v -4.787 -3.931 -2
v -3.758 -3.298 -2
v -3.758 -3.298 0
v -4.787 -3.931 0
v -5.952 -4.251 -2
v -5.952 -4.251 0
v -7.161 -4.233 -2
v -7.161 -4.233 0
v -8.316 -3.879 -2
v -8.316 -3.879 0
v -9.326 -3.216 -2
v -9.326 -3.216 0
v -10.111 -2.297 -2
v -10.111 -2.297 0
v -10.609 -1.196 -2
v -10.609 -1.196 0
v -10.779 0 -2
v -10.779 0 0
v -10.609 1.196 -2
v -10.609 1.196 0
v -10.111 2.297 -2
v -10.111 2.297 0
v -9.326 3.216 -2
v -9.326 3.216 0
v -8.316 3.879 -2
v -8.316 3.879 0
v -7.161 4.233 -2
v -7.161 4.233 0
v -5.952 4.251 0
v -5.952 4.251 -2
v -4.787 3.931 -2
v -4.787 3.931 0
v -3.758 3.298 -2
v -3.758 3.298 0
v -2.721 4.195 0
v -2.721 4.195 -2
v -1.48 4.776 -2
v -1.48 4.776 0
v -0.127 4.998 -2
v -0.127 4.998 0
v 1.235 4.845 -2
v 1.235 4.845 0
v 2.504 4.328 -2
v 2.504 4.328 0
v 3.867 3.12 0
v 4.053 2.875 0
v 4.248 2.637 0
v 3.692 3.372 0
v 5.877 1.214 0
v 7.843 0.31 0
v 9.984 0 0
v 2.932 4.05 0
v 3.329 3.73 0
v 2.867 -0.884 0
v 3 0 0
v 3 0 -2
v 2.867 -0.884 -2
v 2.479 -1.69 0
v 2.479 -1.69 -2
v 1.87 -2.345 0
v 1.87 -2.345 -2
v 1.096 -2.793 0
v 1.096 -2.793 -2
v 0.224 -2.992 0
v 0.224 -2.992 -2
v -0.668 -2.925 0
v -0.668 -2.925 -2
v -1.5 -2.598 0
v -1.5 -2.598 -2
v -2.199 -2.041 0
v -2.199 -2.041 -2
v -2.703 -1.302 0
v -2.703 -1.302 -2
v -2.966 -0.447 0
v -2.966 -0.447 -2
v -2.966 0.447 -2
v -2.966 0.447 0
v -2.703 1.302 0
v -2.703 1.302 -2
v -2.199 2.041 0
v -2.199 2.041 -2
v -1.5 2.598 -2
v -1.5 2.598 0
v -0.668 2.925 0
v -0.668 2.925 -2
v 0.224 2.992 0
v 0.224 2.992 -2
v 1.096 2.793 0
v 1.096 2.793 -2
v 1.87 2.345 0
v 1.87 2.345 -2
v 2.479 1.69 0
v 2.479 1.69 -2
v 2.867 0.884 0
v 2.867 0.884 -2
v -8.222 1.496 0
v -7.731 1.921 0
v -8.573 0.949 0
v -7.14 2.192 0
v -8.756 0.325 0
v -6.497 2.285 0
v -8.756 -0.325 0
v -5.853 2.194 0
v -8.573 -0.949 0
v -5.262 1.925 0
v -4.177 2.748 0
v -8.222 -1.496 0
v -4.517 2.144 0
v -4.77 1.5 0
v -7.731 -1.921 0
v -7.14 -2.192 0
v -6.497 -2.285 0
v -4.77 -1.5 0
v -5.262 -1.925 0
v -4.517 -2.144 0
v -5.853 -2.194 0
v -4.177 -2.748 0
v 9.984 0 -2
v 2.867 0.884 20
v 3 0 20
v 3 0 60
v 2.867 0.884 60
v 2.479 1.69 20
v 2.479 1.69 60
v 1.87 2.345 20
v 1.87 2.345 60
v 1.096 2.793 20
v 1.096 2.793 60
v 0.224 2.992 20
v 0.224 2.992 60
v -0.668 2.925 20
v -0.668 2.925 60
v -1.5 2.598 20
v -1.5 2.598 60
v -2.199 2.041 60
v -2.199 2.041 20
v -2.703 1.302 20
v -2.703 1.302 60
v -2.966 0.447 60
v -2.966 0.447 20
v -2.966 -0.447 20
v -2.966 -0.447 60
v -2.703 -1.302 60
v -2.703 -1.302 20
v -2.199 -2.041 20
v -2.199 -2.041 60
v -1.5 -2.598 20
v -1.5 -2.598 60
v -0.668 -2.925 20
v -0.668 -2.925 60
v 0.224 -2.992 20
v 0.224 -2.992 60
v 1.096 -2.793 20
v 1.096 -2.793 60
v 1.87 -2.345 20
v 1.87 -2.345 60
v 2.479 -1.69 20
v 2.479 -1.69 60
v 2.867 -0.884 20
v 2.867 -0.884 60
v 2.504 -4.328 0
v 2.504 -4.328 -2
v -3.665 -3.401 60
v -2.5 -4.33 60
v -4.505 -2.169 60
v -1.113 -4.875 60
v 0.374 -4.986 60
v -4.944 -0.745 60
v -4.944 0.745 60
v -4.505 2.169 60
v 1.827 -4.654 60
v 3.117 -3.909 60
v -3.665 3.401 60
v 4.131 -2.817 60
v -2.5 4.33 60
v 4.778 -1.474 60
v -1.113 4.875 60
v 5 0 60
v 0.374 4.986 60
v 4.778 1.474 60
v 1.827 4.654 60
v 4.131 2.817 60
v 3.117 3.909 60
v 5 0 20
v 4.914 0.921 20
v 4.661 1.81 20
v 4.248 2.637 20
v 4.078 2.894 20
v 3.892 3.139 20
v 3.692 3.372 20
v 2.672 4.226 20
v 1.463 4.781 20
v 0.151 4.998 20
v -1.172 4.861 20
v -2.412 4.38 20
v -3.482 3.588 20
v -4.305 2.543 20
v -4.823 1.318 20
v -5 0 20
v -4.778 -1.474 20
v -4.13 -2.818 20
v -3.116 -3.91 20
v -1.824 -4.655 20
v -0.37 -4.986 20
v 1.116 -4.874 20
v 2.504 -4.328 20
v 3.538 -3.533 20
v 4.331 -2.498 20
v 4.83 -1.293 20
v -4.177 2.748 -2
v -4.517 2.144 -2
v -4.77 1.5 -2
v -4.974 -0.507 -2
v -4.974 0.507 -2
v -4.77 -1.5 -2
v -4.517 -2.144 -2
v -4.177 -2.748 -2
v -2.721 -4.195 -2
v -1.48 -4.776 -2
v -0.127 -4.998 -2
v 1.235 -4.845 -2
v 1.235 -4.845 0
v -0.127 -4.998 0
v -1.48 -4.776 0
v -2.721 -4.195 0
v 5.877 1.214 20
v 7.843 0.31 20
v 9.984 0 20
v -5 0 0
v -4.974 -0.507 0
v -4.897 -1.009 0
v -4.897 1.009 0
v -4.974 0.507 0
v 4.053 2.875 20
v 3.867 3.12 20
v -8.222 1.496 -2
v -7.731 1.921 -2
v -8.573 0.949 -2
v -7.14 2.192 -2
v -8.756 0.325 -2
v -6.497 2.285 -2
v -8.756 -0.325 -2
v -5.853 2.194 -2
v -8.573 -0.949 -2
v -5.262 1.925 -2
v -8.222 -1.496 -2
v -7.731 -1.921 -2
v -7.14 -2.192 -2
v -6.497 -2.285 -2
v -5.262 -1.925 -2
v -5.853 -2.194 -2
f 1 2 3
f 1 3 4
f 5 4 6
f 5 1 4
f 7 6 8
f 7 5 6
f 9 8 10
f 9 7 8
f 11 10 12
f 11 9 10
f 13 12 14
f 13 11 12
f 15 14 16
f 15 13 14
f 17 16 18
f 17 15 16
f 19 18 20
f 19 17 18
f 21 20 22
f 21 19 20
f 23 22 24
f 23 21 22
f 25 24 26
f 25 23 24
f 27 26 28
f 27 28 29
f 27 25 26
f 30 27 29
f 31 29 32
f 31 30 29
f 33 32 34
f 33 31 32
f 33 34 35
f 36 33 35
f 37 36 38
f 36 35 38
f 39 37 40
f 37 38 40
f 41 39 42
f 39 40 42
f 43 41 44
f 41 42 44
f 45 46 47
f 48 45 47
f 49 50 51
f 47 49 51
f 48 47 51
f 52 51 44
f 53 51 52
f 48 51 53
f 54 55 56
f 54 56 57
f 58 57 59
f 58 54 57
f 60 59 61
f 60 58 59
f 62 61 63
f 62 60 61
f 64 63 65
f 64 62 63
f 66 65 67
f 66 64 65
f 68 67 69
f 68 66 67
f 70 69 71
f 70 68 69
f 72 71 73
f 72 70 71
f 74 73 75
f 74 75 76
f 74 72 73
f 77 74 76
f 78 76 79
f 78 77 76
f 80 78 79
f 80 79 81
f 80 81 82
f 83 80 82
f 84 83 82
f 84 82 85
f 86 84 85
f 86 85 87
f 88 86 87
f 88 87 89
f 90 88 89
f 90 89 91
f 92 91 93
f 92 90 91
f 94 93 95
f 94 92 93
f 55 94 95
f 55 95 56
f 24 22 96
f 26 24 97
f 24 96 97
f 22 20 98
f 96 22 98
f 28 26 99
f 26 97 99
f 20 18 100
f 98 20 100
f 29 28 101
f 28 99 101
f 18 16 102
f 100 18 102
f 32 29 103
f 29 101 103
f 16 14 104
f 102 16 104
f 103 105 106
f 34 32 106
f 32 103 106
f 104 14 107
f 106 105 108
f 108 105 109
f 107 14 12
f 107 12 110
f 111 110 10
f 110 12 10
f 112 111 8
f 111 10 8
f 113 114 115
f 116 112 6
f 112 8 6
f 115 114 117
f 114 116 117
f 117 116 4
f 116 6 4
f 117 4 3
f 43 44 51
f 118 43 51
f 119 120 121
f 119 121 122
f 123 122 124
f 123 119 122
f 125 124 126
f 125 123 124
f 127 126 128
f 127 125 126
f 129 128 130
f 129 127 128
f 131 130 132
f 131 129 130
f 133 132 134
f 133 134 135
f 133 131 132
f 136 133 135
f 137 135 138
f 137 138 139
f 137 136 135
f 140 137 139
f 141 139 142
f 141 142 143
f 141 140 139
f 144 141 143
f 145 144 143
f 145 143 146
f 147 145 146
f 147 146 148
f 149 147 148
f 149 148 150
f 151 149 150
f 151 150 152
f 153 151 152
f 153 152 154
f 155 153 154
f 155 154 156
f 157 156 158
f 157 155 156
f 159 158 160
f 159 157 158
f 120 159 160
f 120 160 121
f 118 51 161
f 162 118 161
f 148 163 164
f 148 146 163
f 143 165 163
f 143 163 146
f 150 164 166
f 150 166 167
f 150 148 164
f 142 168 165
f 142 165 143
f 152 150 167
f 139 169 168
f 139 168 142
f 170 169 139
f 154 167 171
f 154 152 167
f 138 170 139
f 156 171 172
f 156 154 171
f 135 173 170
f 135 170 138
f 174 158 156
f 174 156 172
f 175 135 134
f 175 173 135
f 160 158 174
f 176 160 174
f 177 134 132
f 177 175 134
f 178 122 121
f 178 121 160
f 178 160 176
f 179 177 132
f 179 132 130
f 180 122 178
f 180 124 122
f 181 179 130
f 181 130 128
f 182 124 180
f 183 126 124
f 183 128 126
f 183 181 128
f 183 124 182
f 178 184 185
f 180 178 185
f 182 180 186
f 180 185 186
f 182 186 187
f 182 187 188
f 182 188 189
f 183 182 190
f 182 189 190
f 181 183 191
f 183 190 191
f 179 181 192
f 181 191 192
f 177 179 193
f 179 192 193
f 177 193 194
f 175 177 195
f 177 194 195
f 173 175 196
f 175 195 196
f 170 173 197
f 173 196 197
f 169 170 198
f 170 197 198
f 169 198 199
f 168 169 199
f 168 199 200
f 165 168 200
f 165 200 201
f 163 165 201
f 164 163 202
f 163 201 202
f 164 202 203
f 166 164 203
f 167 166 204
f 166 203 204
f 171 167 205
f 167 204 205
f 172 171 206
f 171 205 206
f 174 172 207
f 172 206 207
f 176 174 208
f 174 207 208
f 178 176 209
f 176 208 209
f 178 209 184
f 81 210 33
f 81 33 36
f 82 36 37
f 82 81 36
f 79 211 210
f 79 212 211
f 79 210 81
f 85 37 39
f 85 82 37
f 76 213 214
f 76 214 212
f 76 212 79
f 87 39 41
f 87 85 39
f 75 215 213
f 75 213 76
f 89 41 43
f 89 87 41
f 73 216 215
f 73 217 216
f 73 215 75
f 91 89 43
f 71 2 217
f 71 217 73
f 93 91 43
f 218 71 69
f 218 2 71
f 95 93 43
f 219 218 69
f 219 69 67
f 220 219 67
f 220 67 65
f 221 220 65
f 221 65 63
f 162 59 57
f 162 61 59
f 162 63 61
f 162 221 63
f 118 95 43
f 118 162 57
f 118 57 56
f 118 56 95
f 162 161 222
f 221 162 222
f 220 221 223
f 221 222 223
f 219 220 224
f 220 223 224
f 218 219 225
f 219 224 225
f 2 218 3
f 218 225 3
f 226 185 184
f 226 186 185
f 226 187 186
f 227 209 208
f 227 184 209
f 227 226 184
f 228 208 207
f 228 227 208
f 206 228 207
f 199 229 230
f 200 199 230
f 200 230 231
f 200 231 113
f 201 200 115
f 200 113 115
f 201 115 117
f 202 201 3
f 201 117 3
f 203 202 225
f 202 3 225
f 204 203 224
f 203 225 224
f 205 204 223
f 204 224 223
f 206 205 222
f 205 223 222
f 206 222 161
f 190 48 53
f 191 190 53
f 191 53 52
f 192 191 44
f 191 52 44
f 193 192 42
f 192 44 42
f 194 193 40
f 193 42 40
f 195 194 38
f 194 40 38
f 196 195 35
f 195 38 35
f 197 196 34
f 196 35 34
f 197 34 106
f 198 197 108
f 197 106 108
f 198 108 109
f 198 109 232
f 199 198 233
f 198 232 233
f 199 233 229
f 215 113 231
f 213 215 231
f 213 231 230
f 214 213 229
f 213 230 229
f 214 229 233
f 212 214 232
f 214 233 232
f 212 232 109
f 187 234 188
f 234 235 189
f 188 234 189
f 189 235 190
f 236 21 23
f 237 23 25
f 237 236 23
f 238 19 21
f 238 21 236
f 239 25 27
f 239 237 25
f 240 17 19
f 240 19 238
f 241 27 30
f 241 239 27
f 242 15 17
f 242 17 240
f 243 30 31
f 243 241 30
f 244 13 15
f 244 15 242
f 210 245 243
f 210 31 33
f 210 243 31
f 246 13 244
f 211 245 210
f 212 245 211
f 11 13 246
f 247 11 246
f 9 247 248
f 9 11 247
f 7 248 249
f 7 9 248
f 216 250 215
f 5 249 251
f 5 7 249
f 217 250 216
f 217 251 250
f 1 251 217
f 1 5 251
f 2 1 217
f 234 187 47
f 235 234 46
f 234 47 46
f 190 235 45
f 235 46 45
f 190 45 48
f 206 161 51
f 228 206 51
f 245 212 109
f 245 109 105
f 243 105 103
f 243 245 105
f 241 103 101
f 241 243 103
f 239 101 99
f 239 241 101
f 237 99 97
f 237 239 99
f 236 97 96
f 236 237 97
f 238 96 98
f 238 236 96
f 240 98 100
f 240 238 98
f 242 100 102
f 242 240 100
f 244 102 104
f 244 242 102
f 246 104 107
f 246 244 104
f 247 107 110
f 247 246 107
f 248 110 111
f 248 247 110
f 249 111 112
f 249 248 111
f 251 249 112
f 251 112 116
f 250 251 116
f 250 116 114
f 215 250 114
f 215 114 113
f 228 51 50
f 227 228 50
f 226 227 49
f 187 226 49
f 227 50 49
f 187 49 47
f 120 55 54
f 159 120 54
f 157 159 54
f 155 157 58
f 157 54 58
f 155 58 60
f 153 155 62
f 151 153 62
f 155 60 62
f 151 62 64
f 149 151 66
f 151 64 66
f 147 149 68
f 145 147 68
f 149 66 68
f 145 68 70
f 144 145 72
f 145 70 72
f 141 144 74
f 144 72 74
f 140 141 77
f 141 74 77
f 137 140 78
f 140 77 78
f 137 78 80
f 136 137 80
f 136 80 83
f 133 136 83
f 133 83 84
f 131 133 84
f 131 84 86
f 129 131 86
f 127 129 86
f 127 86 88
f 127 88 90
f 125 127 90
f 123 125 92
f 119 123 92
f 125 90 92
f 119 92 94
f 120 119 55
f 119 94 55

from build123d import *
from build123d import SkipClean  # not in build123d's __all__

# Parameters (mm, degrees)
F1_DEPTH = 20
F2_R     = 5
F2_R_2   = 3
F3_DEPTH = 40
F4_R     = 3
F5_DEPTH = 2
F7_DEPTH = 2


with BuildPart() as f1:
    # F0 (on Top) → F1 (new body)
    with BuildSketch(Plane.XY):
        with BuildLine():
            ThreePointArc((3.6918747639, 3.3719520649), (-1.8084006996, 4.661511226), (-5, 0))
            ThreePointArc((-5, 0), (-2.4980082156, -4.3312763656), (2.503981982, -4.327825578))
            Line((2.503981982, -4.327825578), (9.9840974016, 0))
            ThreePointArc((9.9840974016, 0), (6.8273158844, 0.6909487043), (4.2478112604, 2.637441847))
            ThreePointArc((4.2478112604, 2.637441847), (3.9586403918, 2.9962179106), (3.6918747639, 3.3719520649))
        make_face()
        with BuildLine():
            ThreePointArc((-3, 0), (0, 3), (3, 0))
            ThreePointArc((3, 0), (0, -3), (-3, 0))
        make_face(mode=Mode.SUBTRACT)
    extrude(amount=F1_DEPTH)

    # F2 (on face) → F3 (join)
    with BuildSketch(Plane.XY.offset(20)):
        Circle(F2_R)
        Circle(F2_R_2, mode=Mode.SUBTRACT)
    extrude(amount=F3_DEPTH)

    # F4 (on face) → F5 (join)
    with BuildSketch(Plane(origin=(0, 0, 0), x_dir=(1, 0, 0), z_dir=(0, 0, -1))):
        with BuildLine():
            ThreePointArc((3.6918747639, -3.3719520649), (6.414709273, -0.8961214102), (9.9840974016, 0))
            Line((9.9840974016, 0), (2.503981982, 4.327825578))
            ThreePointArc((2.503981982, 4.327825578), (-5, 0), (2.503981982, -4.327825578))
            ThreePointArc((2.503981982, -4.327825578), (3.1345787192, -3.8954353098), (3.6918747639, -3.3719520649))
        make_face()
        Circle(F4_R, mode=Mode.SUBTRACT)
        with BuildLine():
            Line((2.503981982, -4.327825578), (9.9840974016, 0))
            ThreePointArc((9.9840974016, 0), (6.414709273, -0.8961214102), (3.6918747639, -3.3719520649))
            ThreePointArc((3.6918747639, -3.3719520649), (3.1345787192, -3.8954353098), (2.503981982, -4.327825578))
        make_face()
    with SkipClean():  # cleaning this boolean's faces spoils the solid; the shape is the same uncleaned
        extrude(amount=F5_DEPTH)

    # F6 (on face) → F7 (join)
    with BuildSketch(Plane(origin=(0, 0, -2), x_dir=(1, 0, 0), z_dir=(0, 0, -1))):
        with BuildLine():
            ThreePointArc((-4.7696960071, -1.5), (-8.7790290978, 0), (-4.7696960071, 1.5))
            ThreePointArc((-4.7696960071, 1.5), (-4.3575549598, 2.4518798446), (-3.7578759927, 3.2982371084))
            ThreePointArc((-3.7578759927, 3.2982371084), (-10.7790290978, 0), (-3.7578759927, -3.2982371084))
            ThreePointArc((-3.7578759927, -3.2982371084), (-4.3575549598, -2.4518798446), (-4.7696960071, -1.5))
        make_face()
    with SkipClean():  # cleaning this boolean's faces spoils the solid; the shape is the same uncleaned
        extrude(amount=-F7_DEPTH)


solid = f1.part
